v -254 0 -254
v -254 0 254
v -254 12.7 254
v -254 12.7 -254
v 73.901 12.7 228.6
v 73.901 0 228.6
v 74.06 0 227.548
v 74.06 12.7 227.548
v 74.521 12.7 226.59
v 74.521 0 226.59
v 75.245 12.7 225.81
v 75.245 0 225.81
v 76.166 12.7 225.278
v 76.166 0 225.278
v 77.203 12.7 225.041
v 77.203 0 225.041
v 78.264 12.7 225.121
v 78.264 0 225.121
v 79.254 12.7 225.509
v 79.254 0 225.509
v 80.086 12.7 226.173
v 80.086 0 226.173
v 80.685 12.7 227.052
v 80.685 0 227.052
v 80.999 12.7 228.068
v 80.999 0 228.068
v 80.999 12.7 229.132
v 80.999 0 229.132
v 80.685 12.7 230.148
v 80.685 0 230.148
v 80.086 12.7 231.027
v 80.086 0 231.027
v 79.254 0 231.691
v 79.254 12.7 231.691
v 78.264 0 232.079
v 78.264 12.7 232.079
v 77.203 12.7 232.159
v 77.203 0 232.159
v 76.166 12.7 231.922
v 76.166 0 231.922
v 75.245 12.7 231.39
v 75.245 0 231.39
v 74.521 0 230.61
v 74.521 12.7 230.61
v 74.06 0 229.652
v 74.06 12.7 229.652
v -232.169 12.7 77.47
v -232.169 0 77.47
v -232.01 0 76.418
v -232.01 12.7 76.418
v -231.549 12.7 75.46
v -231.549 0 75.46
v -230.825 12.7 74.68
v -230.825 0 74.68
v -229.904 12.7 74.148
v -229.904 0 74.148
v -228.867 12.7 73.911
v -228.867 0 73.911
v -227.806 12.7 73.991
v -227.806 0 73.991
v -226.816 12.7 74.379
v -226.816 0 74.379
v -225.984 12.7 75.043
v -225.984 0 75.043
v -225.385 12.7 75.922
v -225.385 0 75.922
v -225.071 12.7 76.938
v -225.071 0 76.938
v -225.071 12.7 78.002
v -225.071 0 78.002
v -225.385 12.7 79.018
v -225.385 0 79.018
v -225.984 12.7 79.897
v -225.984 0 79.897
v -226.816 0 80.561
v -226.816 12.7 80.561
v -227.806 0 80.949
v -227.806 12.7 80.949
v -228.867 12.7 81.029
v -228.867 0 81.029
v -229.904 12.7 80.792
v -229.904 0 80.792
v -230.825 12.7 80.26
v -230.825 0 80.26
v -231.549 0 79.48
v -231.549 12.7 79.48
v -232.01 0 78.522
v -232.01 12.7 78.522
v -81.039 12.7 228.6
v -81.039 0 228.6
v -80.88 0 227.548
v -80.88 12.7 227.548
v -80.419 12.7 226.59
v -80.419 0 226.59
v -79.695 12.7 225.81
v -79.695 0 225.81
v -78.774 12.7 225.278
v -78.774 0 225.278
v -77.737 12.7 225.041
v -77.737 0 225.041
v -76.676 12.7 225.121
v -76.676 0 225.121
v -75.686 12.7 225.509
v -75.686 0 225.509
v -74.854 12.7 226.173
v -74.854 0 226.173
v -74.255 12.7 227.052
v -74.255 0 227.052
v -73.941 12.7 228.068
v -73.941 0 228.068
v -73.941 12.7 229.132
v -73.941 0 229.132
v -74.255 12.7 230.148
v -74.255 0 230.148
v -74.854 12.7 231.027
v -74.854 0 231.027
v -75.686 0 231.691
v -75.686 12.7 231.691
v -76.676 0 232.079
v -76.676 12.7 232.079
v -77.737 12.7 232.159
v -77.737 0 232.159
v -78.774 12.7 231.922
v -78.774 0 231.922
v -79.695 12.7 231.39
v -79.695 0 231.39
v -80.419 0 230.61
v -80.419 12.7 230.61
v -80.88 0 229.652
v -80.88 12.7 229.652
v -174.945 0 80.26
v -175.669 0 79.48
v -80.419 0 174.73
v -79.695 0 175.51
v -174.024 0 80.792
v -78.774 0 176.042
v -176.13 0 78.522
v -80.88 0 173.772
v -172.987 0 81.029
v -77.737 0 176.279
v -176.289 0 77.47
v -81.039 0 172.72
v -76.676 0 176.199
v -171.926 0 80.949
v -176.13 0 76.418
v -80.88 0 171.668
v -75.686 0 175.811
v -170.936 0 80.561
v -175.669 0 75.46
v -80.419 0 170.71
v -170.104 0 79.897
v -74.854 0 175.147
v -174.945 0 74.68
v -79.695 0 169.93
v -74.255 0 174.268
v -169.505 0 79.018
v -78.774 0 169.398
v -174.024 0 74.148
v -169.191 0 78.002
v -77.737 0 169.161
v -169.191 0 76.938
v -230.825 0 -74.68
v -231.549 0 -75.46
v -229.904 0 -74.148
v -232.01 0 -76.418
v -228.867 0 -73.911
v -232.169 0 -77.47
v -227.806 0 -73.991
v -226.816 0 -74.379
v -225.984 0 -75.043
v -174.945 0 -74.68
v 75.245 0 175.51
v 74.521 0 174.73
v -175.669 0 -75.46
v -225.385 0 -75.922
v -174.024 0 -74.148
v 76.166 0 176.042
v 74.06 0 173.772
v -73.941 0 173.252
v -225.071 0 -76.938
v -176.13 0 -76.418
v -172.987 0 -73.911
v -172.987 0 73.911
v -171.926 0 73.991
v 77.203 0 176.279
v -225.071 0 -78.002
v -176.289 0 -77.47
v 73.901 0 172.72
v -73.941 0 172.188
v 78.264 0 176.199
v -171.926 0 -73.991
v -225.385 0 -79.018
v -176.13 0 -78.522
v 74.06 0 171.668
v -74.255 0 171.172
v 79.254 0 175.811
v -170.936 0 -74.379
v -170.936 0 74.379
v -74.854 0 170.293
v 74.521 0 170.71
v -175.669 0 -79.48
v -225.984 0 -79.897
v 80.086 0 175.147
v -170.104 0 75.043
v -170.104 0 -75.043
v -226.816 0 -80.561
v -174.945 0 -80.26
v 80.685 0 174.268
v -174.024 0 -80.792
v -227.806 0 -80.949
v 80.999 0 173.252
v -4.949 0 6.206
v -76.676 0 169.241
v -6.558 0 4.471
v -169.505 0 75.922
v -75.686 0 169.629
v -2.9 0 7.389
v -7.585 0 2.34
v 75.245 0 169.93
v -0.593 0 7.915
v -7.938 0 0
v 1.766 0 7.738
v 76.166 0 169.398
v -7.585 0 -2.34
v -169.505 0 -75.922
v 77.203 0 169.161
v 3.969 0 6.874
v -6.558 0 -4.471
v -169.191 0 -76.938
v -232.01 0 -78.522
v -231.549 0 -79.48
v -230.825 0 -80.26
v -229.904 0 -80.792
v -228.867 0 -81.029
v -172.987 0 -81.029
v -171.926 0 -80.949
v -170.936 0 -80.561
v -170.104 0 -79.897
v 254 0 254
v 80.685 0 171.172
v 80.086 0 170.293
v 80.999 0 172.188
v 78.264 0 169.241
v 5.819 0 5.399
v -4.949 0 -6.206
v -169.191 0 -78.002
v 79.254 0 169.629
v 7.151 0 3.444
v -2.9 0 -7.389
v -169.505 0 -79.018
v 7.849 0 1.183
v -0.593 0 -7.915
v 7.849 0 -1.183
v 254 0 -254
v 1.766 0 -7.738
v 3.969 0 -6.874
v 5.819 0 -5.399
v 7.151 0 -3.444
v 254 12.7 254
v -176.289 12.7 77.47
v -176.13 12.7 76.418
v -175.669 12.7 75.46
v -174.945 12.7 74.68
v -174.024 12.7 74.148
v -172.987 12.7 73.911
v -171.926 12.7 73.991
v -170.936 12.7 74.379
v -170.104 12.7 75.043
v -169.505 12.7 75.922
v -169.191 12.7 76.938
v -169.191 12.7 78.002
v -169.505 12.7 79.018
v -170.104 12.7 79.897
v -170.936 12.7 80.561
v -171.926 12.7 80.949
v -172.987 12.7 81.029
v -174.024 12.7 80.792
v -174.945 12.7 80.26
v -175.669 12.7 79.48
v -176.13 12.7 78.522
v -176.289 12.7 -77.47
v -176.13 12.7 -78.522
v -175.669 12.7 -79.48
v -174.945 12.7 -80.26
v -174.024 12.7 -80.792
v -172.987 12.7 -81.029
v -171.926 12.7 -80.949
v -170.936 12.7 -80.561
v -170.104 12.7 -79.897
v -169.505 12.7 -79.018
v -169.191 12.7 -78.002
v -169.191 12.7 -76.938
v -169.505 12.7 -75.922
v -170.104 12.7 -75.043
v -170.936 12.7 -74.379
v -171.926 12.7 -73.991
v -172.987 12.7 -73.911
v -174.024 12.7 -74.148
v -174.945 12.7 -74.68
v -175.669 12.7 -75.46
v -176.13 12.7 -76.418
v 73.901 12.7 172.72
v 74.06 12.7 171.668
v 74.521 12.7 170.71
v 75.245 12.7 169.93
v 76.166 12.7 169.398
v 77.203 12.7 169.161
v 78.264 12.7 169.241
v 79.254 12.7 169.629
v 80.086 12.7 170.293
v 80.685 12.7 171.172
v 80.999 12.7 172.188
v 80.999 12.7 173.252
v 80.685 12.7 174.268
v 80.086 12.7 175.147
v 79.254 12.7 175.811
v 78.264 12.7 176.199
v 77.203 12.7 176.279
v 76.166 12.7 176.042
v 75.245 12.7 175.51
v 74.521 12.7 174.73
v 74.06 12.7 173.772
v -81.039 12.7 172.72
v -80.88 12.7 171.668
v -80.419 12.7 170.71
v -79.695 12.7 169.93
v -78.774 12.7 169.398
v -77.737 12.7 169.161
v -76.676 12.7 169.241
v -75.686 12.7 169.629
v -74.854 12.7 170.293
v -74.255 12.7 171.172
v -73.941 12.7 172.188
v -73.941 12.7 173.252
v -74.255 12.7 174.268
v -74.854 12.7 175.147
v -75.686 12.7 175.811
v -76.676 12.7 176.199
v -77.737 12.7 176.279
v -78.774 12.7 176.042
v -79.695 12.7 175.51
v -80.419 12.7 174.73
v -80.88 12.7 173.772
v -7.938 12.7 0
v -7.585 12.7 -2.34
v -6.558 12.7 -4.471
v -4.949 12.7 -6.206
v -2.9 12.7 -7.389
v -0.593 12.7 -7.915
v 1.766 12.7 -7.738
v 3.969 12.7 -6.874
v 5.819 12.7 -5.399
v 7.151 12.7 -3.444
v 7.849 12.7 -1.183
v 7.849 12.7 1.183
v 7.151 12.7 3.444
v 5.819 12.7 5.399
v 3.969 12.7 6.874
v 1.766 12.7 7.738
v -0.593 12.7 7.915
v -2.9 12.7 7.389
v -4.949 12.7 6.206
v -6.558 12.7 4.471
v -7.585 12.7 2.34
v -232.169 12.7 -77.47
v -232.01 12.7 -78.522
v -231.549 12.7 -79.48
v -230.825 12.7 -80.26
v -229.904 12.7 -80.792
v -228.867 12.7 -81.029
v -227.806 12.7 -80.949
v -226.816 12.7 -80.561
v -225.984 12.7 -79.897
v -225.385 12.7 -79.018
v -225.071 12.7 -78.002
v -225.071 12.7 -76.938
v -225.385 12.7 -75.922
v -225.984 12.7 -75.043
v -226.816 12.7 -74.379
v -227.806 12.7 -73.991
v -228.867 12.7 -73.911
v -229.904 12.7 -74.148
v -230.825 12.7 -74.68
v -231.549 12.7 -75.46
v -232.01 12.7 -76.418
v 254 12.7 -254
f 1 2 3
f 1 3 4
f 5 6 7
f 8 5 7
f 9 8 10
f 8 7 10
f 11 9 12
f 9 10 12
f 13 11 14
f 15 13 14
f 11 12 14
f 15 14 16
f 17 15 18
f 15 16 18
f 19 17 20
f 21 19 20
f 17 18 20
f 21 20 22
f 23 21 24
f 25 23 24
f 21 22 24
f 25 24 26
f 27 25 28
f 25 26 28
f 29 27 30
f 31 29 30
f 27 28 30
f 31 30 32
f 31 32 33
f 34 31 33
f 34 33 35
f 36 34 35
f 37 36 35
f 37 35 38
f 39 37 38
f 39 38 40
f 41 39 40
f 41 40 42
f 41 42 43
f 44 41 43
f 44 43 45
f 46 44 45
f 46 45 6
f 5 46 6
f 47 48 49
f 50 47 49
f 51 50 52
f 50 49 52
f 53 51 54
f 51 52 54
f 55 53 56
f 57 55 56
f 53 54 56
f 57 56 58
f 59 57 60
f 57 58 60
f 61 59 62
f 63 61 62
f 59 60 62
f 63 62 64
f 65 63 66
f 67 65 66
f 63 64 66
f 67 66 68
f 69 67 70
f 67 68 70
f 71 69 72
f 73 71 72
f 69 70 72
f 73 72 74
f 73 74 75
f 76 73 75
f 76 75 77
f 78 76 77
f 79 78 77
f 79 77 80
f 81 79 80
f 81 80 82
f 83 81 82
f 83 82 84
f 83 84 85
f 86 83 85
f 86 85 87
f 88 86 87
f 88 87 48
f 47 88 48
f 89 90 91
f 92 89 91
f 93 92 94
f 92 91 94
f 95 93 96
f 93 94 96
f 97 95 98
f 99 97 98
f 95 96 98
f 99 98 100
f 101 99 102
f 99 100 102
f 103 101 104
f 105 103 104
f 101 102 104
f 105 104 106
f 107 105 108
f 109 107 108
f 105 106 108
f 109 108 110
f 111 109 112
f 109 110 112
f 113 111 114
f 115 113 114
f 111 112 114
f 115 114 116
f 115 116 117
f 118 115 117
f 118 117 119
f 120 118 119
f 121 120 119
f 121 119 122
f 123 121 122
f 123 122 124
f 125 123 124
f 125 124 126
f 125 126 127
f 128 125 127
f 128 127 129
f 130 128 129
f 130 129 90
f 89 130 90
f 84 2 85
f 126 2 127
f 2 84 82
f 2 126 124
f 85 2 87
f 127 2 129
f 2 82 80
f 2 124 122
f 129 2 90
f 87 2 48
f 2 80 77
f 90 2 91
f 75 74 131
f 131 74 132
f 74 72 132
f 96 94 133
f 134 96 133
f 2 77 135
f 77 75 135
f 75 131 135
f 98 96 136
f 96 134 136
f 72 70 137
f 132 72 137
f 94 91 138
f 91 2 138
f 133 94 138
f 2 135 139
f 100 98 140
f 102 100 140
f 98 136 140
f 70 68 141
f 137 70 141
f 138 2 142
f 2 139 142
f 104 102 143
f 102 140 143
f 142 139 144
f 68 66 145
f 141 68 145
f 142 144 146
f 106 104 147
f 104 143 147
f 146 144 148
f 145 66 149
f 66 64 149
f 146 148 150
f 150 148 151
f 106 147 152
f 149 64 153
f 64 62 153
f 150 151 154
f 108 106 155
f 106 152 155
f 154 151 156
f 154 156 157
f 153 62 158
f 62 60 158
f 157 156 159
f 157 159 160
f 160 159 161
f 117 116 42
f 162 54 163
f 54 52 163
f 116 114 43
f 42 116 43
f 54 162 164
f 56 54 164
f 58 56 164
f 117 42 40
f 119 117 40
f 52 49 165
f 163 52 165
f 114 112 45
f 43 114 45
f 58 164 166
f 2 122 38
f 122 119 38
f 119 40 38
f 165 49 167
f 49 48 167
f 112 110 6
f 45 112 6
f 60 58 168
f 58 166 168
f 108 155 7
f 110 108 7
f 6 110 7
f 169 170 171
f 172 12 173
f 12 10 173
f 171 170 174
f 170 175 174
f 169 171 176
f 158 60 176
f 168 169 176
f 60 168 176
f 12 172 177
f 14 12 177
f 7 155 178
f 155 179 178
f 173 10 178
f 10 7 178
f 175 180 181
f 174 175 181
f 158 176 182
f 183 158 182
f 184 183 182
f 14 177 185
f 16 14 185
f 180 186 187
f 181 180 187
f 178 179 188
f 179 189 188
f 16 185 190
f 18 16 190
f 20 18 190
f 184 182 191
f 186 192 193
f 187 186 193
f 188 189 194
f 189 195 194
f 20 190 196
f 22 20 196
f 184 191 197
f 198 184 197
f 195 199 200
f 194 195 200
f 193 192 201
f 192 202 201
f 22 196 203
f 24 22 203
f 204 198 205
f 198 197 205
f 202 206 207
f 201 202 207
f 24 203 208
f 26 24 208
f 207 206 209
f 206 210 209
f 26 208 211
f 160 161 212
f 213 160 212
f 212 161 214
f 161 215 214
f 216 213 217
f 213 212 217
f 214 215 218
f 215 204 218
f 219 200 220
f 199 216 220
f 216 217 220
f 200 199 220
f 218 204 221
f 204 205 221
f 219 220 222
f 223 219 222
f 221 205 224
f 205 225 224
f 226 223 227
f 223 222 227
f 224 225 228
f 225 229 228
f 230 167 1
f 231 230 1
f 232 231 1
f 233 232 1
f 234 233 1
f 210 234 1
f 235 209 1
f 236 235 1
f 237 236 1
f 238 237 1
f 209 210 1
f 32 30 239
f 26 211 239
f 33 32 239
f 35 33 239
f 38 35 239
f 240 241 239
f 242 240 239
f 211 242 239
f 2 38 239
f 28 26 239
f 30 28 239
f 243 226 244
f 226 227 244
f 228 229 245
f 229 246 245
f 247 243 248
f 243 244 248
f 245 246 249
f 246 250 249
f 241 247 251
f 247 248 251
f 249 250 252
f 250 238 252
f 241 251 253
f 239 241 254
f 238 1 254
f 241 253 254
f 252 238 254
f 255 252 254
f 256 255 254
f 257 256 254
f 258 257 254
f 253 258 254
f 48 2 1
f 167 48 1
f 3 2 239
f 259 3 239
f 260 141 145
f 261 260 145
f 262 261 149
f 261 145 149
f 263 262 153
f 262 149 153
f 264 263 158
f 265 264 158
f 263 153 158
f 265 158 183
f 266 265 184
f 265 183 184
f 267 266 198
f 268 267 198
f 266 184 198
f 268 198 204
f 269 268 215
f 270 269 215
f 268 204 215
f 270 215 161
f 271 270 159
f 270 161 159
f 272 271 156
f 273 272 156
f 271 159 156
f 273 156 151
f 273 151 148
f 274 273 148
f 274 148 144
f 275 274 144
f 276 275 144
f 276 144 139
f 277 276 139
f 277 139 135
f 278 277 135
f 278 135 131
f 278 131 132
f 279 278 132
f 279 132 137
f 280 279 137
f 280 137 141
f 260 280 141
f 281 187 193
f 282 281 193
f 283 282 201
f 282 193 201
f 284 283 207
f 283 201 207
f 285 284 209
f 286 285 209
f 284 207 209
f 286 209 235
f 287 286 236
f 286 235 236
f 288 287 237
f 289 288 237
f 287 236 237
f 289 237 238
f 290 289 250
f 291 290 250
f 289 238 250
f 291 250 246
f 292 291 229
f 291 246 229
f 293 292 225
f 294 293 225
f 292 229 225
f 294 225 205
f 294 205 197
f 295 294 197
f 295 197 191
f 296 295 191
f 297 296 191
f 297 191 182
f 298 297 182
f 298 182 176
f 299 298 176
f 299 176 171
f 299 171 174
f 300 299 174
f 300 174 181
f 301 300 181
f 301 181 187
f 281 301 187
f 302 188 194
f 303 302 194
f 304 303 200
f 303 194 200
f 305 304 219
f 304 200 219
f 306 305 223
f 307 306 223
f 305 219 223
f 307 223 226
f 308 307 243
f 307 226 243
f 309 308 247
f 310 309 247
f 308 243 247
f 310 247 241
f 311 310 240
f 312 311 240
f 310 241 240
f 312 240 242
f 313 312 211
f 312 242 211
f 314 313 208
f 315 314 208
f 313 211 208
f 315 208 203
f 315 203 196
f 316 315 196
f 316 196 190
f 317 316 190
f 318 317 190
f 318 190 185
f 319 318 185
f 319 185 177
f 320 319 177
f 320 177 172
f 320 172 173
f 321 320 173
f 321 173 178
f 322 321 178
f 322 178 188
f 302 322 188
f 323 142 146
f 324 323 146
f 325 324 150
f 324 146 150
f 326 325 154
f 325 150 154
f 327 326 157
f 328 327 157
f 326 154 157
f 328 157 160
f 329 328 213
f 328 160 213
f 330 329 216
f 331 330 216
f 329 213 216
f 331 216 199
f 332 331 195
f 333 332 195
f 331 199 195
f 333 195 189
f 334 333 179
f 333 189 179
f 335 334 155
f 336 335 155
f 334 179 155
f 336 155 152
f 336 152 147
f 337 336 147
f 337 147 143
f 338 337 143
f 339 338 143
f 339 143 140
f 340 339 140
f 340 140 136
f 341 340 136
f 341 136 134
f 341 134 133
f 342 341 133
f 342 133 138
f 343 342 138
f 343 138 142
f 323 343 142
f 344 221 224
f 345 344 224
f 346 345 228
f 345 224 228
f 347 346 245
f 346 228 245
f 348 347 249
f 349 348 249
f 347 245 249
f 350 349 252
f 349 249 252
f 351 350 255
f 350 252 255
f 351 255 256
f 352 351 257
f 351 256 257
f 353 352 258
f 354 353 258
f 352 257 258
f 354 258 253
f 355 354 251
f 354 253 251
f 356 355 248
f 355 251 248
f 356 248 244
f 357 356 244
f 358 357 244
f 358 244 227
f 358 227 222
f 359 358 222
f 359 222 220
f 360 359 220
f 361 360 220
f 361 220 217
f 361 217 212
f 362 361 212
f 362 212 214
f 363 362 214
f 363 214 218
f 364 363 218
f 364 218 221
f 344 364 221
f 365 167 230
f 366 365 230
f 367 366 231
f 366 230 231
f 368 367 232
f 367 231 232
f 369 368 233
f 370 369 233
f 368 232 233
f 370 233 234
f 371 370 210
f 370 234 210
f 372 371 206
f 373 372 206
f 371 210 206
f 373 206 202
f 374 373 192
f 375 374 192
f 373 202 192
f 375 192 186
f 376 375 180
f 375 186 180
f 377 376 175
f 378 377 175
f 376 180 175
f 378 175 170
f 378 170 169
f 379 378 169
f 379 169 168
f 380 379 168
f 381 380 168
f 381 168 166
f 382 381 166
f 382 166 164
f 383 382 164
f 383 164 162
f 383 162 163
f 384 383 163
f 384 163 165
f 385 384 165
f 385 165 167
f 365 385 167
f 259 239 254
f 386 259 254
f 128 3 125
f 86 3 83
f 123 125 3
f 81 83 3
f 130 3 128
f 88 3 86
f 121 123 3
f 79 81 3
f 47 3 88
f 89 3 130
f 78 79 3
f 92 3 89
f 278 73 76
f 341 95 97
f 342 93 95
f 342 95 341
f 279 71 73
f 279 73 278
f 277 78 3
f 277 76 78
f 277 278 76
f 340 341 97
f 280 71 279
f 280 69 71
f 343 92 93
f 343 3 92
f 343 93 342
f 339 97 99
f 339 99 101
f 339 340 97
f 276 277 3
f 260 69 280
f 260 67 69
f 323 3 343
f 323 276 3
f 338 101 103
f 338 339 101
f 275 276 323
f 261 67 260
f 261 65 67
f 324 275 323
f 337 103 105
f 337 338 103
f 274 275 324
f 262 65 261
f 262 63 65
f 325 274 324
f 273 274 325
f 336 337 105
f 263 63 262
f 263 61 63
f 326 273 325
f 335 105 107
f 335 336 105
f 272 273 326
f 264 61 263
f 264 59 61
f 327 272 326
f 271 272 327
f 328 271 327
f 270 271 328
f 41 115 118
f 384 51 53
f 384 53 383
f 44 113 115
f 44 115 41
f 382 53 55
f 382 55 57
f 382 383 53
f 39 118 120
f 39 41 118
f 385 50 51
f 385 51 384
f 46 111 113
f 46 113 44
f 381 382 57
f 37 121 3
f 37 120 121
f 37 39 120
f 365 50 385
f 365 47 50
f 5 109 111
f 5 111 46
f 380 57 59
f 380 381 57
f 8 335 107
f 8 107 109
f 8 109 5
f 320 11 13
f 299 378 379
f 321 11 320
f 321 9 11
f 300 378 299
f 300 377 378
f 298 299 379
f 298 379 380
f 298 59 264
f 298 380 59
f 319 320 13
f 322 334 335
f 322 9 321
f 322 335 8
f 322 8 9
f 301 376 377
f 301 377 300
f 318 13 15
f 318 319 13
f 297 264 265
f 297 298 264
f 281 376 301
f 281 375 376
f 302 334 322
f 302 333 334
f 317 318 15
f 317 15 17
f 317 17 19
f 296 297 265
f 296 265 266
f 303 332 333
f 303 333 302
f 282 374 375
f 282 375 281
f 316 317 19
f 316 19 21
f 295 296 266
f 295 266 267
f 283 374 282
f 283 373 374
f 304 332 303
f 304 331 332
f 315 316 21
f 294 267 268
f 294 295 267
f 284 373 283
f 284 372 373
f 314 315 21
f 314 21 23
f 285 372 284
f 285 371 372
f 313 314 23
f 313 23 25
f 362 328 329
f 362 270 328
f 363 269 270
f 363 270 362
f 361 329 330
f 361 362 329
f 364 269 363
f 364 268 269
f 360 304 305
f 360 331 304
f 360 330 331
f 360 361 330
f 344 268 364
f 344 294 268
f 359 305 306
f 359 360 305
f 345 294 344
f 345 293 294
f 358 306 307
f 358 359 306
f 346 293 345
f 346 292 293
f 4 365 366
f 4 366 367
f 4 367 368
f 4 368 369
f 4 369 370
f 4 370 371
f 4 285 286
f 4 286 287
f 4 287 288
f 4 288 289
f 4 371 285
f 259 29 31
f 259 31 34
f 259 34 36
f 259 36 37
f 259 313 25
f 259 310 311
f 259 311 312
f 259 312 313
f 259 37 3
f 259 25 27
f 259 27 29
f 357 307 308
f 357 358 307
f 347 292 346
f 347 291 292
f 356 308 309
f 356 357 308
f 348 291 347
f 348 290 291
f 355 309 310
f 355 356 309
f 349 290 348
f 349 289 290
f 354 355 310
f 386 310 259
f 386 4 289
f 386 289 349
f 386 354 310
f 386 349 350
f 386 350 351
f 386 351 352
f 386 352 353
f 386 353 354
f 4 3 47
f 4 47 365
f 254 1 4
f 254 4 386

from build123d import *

# Parameters (mm, degrees)
SKETCH1_W                        = 508
SKETCH1_H                        = 508
BOSS_EXTRUDE1_DEPTH              = 12.7
K_0_281_DIAMETER_HOLE1_D         = 7.1374
K_0_281_DIAMETER_HOLE1_DEPTH     = 12.7
F_5_8_0_625_DIAMETER_HOLE1_D     = 15.875
F_5_8_0_625_DIAMETER_HOLE1_DEPTH = 25.4
F_5_8_0_625_DIAMETER_HOLE1_TIP   = 4.769331164


with BuildPart() as part:
    # Sketch1 → Boss-Extrude1 (new body)
    with BuildSketch(Plane(origin=(0, 0, 0), x_dir=(1, 0, 0), z_dir=(0, 1, 0))):
        Rectangle(SKETCH1_W, SKETCH1_H)
    extrude(amount=BOSS_EXTRUDE1_DEPTH)

    # K (0.281) Diameter Hole1
    with Locations(Plane(origin=(0, 12.7, 0), x_dir=(1, 0, 0), z_dir=(0, 1, 0))):
        with Locations((-77.47, -228.6), (-77.47, -172.72), (77.47, -172.72), (77.47, -228.6), (-228.6, -77.47), (-172.72, -77.47), (-172.72, 77.47), (-228.6, 77.47)):
            Hole(K_0_281_DIAMETER_HOLE1_D / 2, depth=K_0_281_DIAMETER_HOLE1_DEPTH)

    # 5/8 (0.625) Diameter Hole1
    with Locations(Plane(origin=(0, 12.7, 0), x_dir=(1, 0, 0), z_dir=(0, 1, 0))):
        with Locations((0, 0)):
            Hole(F_5_8_0_625_DIAMETER_HOLE1_D / 2, depth=F_5_8_0_625_DIAMETER_HOLE1_DEPTH)
            with Locations((0, 0, -(F_5_8_0_625_DIAMETER_HOLE1_DEPTH + F_5_8_0_625_DIAMETER_HOLE1_TIP / 2))):  # 118° drill point
                Cone(0, F_5_8_0_625_DIAMETER_HOLE1_D / 2, F_5_8_0_625_DIAMETER_HOLE1_TIP, mode=Mode.SUBTRACT)


solid = part.part
